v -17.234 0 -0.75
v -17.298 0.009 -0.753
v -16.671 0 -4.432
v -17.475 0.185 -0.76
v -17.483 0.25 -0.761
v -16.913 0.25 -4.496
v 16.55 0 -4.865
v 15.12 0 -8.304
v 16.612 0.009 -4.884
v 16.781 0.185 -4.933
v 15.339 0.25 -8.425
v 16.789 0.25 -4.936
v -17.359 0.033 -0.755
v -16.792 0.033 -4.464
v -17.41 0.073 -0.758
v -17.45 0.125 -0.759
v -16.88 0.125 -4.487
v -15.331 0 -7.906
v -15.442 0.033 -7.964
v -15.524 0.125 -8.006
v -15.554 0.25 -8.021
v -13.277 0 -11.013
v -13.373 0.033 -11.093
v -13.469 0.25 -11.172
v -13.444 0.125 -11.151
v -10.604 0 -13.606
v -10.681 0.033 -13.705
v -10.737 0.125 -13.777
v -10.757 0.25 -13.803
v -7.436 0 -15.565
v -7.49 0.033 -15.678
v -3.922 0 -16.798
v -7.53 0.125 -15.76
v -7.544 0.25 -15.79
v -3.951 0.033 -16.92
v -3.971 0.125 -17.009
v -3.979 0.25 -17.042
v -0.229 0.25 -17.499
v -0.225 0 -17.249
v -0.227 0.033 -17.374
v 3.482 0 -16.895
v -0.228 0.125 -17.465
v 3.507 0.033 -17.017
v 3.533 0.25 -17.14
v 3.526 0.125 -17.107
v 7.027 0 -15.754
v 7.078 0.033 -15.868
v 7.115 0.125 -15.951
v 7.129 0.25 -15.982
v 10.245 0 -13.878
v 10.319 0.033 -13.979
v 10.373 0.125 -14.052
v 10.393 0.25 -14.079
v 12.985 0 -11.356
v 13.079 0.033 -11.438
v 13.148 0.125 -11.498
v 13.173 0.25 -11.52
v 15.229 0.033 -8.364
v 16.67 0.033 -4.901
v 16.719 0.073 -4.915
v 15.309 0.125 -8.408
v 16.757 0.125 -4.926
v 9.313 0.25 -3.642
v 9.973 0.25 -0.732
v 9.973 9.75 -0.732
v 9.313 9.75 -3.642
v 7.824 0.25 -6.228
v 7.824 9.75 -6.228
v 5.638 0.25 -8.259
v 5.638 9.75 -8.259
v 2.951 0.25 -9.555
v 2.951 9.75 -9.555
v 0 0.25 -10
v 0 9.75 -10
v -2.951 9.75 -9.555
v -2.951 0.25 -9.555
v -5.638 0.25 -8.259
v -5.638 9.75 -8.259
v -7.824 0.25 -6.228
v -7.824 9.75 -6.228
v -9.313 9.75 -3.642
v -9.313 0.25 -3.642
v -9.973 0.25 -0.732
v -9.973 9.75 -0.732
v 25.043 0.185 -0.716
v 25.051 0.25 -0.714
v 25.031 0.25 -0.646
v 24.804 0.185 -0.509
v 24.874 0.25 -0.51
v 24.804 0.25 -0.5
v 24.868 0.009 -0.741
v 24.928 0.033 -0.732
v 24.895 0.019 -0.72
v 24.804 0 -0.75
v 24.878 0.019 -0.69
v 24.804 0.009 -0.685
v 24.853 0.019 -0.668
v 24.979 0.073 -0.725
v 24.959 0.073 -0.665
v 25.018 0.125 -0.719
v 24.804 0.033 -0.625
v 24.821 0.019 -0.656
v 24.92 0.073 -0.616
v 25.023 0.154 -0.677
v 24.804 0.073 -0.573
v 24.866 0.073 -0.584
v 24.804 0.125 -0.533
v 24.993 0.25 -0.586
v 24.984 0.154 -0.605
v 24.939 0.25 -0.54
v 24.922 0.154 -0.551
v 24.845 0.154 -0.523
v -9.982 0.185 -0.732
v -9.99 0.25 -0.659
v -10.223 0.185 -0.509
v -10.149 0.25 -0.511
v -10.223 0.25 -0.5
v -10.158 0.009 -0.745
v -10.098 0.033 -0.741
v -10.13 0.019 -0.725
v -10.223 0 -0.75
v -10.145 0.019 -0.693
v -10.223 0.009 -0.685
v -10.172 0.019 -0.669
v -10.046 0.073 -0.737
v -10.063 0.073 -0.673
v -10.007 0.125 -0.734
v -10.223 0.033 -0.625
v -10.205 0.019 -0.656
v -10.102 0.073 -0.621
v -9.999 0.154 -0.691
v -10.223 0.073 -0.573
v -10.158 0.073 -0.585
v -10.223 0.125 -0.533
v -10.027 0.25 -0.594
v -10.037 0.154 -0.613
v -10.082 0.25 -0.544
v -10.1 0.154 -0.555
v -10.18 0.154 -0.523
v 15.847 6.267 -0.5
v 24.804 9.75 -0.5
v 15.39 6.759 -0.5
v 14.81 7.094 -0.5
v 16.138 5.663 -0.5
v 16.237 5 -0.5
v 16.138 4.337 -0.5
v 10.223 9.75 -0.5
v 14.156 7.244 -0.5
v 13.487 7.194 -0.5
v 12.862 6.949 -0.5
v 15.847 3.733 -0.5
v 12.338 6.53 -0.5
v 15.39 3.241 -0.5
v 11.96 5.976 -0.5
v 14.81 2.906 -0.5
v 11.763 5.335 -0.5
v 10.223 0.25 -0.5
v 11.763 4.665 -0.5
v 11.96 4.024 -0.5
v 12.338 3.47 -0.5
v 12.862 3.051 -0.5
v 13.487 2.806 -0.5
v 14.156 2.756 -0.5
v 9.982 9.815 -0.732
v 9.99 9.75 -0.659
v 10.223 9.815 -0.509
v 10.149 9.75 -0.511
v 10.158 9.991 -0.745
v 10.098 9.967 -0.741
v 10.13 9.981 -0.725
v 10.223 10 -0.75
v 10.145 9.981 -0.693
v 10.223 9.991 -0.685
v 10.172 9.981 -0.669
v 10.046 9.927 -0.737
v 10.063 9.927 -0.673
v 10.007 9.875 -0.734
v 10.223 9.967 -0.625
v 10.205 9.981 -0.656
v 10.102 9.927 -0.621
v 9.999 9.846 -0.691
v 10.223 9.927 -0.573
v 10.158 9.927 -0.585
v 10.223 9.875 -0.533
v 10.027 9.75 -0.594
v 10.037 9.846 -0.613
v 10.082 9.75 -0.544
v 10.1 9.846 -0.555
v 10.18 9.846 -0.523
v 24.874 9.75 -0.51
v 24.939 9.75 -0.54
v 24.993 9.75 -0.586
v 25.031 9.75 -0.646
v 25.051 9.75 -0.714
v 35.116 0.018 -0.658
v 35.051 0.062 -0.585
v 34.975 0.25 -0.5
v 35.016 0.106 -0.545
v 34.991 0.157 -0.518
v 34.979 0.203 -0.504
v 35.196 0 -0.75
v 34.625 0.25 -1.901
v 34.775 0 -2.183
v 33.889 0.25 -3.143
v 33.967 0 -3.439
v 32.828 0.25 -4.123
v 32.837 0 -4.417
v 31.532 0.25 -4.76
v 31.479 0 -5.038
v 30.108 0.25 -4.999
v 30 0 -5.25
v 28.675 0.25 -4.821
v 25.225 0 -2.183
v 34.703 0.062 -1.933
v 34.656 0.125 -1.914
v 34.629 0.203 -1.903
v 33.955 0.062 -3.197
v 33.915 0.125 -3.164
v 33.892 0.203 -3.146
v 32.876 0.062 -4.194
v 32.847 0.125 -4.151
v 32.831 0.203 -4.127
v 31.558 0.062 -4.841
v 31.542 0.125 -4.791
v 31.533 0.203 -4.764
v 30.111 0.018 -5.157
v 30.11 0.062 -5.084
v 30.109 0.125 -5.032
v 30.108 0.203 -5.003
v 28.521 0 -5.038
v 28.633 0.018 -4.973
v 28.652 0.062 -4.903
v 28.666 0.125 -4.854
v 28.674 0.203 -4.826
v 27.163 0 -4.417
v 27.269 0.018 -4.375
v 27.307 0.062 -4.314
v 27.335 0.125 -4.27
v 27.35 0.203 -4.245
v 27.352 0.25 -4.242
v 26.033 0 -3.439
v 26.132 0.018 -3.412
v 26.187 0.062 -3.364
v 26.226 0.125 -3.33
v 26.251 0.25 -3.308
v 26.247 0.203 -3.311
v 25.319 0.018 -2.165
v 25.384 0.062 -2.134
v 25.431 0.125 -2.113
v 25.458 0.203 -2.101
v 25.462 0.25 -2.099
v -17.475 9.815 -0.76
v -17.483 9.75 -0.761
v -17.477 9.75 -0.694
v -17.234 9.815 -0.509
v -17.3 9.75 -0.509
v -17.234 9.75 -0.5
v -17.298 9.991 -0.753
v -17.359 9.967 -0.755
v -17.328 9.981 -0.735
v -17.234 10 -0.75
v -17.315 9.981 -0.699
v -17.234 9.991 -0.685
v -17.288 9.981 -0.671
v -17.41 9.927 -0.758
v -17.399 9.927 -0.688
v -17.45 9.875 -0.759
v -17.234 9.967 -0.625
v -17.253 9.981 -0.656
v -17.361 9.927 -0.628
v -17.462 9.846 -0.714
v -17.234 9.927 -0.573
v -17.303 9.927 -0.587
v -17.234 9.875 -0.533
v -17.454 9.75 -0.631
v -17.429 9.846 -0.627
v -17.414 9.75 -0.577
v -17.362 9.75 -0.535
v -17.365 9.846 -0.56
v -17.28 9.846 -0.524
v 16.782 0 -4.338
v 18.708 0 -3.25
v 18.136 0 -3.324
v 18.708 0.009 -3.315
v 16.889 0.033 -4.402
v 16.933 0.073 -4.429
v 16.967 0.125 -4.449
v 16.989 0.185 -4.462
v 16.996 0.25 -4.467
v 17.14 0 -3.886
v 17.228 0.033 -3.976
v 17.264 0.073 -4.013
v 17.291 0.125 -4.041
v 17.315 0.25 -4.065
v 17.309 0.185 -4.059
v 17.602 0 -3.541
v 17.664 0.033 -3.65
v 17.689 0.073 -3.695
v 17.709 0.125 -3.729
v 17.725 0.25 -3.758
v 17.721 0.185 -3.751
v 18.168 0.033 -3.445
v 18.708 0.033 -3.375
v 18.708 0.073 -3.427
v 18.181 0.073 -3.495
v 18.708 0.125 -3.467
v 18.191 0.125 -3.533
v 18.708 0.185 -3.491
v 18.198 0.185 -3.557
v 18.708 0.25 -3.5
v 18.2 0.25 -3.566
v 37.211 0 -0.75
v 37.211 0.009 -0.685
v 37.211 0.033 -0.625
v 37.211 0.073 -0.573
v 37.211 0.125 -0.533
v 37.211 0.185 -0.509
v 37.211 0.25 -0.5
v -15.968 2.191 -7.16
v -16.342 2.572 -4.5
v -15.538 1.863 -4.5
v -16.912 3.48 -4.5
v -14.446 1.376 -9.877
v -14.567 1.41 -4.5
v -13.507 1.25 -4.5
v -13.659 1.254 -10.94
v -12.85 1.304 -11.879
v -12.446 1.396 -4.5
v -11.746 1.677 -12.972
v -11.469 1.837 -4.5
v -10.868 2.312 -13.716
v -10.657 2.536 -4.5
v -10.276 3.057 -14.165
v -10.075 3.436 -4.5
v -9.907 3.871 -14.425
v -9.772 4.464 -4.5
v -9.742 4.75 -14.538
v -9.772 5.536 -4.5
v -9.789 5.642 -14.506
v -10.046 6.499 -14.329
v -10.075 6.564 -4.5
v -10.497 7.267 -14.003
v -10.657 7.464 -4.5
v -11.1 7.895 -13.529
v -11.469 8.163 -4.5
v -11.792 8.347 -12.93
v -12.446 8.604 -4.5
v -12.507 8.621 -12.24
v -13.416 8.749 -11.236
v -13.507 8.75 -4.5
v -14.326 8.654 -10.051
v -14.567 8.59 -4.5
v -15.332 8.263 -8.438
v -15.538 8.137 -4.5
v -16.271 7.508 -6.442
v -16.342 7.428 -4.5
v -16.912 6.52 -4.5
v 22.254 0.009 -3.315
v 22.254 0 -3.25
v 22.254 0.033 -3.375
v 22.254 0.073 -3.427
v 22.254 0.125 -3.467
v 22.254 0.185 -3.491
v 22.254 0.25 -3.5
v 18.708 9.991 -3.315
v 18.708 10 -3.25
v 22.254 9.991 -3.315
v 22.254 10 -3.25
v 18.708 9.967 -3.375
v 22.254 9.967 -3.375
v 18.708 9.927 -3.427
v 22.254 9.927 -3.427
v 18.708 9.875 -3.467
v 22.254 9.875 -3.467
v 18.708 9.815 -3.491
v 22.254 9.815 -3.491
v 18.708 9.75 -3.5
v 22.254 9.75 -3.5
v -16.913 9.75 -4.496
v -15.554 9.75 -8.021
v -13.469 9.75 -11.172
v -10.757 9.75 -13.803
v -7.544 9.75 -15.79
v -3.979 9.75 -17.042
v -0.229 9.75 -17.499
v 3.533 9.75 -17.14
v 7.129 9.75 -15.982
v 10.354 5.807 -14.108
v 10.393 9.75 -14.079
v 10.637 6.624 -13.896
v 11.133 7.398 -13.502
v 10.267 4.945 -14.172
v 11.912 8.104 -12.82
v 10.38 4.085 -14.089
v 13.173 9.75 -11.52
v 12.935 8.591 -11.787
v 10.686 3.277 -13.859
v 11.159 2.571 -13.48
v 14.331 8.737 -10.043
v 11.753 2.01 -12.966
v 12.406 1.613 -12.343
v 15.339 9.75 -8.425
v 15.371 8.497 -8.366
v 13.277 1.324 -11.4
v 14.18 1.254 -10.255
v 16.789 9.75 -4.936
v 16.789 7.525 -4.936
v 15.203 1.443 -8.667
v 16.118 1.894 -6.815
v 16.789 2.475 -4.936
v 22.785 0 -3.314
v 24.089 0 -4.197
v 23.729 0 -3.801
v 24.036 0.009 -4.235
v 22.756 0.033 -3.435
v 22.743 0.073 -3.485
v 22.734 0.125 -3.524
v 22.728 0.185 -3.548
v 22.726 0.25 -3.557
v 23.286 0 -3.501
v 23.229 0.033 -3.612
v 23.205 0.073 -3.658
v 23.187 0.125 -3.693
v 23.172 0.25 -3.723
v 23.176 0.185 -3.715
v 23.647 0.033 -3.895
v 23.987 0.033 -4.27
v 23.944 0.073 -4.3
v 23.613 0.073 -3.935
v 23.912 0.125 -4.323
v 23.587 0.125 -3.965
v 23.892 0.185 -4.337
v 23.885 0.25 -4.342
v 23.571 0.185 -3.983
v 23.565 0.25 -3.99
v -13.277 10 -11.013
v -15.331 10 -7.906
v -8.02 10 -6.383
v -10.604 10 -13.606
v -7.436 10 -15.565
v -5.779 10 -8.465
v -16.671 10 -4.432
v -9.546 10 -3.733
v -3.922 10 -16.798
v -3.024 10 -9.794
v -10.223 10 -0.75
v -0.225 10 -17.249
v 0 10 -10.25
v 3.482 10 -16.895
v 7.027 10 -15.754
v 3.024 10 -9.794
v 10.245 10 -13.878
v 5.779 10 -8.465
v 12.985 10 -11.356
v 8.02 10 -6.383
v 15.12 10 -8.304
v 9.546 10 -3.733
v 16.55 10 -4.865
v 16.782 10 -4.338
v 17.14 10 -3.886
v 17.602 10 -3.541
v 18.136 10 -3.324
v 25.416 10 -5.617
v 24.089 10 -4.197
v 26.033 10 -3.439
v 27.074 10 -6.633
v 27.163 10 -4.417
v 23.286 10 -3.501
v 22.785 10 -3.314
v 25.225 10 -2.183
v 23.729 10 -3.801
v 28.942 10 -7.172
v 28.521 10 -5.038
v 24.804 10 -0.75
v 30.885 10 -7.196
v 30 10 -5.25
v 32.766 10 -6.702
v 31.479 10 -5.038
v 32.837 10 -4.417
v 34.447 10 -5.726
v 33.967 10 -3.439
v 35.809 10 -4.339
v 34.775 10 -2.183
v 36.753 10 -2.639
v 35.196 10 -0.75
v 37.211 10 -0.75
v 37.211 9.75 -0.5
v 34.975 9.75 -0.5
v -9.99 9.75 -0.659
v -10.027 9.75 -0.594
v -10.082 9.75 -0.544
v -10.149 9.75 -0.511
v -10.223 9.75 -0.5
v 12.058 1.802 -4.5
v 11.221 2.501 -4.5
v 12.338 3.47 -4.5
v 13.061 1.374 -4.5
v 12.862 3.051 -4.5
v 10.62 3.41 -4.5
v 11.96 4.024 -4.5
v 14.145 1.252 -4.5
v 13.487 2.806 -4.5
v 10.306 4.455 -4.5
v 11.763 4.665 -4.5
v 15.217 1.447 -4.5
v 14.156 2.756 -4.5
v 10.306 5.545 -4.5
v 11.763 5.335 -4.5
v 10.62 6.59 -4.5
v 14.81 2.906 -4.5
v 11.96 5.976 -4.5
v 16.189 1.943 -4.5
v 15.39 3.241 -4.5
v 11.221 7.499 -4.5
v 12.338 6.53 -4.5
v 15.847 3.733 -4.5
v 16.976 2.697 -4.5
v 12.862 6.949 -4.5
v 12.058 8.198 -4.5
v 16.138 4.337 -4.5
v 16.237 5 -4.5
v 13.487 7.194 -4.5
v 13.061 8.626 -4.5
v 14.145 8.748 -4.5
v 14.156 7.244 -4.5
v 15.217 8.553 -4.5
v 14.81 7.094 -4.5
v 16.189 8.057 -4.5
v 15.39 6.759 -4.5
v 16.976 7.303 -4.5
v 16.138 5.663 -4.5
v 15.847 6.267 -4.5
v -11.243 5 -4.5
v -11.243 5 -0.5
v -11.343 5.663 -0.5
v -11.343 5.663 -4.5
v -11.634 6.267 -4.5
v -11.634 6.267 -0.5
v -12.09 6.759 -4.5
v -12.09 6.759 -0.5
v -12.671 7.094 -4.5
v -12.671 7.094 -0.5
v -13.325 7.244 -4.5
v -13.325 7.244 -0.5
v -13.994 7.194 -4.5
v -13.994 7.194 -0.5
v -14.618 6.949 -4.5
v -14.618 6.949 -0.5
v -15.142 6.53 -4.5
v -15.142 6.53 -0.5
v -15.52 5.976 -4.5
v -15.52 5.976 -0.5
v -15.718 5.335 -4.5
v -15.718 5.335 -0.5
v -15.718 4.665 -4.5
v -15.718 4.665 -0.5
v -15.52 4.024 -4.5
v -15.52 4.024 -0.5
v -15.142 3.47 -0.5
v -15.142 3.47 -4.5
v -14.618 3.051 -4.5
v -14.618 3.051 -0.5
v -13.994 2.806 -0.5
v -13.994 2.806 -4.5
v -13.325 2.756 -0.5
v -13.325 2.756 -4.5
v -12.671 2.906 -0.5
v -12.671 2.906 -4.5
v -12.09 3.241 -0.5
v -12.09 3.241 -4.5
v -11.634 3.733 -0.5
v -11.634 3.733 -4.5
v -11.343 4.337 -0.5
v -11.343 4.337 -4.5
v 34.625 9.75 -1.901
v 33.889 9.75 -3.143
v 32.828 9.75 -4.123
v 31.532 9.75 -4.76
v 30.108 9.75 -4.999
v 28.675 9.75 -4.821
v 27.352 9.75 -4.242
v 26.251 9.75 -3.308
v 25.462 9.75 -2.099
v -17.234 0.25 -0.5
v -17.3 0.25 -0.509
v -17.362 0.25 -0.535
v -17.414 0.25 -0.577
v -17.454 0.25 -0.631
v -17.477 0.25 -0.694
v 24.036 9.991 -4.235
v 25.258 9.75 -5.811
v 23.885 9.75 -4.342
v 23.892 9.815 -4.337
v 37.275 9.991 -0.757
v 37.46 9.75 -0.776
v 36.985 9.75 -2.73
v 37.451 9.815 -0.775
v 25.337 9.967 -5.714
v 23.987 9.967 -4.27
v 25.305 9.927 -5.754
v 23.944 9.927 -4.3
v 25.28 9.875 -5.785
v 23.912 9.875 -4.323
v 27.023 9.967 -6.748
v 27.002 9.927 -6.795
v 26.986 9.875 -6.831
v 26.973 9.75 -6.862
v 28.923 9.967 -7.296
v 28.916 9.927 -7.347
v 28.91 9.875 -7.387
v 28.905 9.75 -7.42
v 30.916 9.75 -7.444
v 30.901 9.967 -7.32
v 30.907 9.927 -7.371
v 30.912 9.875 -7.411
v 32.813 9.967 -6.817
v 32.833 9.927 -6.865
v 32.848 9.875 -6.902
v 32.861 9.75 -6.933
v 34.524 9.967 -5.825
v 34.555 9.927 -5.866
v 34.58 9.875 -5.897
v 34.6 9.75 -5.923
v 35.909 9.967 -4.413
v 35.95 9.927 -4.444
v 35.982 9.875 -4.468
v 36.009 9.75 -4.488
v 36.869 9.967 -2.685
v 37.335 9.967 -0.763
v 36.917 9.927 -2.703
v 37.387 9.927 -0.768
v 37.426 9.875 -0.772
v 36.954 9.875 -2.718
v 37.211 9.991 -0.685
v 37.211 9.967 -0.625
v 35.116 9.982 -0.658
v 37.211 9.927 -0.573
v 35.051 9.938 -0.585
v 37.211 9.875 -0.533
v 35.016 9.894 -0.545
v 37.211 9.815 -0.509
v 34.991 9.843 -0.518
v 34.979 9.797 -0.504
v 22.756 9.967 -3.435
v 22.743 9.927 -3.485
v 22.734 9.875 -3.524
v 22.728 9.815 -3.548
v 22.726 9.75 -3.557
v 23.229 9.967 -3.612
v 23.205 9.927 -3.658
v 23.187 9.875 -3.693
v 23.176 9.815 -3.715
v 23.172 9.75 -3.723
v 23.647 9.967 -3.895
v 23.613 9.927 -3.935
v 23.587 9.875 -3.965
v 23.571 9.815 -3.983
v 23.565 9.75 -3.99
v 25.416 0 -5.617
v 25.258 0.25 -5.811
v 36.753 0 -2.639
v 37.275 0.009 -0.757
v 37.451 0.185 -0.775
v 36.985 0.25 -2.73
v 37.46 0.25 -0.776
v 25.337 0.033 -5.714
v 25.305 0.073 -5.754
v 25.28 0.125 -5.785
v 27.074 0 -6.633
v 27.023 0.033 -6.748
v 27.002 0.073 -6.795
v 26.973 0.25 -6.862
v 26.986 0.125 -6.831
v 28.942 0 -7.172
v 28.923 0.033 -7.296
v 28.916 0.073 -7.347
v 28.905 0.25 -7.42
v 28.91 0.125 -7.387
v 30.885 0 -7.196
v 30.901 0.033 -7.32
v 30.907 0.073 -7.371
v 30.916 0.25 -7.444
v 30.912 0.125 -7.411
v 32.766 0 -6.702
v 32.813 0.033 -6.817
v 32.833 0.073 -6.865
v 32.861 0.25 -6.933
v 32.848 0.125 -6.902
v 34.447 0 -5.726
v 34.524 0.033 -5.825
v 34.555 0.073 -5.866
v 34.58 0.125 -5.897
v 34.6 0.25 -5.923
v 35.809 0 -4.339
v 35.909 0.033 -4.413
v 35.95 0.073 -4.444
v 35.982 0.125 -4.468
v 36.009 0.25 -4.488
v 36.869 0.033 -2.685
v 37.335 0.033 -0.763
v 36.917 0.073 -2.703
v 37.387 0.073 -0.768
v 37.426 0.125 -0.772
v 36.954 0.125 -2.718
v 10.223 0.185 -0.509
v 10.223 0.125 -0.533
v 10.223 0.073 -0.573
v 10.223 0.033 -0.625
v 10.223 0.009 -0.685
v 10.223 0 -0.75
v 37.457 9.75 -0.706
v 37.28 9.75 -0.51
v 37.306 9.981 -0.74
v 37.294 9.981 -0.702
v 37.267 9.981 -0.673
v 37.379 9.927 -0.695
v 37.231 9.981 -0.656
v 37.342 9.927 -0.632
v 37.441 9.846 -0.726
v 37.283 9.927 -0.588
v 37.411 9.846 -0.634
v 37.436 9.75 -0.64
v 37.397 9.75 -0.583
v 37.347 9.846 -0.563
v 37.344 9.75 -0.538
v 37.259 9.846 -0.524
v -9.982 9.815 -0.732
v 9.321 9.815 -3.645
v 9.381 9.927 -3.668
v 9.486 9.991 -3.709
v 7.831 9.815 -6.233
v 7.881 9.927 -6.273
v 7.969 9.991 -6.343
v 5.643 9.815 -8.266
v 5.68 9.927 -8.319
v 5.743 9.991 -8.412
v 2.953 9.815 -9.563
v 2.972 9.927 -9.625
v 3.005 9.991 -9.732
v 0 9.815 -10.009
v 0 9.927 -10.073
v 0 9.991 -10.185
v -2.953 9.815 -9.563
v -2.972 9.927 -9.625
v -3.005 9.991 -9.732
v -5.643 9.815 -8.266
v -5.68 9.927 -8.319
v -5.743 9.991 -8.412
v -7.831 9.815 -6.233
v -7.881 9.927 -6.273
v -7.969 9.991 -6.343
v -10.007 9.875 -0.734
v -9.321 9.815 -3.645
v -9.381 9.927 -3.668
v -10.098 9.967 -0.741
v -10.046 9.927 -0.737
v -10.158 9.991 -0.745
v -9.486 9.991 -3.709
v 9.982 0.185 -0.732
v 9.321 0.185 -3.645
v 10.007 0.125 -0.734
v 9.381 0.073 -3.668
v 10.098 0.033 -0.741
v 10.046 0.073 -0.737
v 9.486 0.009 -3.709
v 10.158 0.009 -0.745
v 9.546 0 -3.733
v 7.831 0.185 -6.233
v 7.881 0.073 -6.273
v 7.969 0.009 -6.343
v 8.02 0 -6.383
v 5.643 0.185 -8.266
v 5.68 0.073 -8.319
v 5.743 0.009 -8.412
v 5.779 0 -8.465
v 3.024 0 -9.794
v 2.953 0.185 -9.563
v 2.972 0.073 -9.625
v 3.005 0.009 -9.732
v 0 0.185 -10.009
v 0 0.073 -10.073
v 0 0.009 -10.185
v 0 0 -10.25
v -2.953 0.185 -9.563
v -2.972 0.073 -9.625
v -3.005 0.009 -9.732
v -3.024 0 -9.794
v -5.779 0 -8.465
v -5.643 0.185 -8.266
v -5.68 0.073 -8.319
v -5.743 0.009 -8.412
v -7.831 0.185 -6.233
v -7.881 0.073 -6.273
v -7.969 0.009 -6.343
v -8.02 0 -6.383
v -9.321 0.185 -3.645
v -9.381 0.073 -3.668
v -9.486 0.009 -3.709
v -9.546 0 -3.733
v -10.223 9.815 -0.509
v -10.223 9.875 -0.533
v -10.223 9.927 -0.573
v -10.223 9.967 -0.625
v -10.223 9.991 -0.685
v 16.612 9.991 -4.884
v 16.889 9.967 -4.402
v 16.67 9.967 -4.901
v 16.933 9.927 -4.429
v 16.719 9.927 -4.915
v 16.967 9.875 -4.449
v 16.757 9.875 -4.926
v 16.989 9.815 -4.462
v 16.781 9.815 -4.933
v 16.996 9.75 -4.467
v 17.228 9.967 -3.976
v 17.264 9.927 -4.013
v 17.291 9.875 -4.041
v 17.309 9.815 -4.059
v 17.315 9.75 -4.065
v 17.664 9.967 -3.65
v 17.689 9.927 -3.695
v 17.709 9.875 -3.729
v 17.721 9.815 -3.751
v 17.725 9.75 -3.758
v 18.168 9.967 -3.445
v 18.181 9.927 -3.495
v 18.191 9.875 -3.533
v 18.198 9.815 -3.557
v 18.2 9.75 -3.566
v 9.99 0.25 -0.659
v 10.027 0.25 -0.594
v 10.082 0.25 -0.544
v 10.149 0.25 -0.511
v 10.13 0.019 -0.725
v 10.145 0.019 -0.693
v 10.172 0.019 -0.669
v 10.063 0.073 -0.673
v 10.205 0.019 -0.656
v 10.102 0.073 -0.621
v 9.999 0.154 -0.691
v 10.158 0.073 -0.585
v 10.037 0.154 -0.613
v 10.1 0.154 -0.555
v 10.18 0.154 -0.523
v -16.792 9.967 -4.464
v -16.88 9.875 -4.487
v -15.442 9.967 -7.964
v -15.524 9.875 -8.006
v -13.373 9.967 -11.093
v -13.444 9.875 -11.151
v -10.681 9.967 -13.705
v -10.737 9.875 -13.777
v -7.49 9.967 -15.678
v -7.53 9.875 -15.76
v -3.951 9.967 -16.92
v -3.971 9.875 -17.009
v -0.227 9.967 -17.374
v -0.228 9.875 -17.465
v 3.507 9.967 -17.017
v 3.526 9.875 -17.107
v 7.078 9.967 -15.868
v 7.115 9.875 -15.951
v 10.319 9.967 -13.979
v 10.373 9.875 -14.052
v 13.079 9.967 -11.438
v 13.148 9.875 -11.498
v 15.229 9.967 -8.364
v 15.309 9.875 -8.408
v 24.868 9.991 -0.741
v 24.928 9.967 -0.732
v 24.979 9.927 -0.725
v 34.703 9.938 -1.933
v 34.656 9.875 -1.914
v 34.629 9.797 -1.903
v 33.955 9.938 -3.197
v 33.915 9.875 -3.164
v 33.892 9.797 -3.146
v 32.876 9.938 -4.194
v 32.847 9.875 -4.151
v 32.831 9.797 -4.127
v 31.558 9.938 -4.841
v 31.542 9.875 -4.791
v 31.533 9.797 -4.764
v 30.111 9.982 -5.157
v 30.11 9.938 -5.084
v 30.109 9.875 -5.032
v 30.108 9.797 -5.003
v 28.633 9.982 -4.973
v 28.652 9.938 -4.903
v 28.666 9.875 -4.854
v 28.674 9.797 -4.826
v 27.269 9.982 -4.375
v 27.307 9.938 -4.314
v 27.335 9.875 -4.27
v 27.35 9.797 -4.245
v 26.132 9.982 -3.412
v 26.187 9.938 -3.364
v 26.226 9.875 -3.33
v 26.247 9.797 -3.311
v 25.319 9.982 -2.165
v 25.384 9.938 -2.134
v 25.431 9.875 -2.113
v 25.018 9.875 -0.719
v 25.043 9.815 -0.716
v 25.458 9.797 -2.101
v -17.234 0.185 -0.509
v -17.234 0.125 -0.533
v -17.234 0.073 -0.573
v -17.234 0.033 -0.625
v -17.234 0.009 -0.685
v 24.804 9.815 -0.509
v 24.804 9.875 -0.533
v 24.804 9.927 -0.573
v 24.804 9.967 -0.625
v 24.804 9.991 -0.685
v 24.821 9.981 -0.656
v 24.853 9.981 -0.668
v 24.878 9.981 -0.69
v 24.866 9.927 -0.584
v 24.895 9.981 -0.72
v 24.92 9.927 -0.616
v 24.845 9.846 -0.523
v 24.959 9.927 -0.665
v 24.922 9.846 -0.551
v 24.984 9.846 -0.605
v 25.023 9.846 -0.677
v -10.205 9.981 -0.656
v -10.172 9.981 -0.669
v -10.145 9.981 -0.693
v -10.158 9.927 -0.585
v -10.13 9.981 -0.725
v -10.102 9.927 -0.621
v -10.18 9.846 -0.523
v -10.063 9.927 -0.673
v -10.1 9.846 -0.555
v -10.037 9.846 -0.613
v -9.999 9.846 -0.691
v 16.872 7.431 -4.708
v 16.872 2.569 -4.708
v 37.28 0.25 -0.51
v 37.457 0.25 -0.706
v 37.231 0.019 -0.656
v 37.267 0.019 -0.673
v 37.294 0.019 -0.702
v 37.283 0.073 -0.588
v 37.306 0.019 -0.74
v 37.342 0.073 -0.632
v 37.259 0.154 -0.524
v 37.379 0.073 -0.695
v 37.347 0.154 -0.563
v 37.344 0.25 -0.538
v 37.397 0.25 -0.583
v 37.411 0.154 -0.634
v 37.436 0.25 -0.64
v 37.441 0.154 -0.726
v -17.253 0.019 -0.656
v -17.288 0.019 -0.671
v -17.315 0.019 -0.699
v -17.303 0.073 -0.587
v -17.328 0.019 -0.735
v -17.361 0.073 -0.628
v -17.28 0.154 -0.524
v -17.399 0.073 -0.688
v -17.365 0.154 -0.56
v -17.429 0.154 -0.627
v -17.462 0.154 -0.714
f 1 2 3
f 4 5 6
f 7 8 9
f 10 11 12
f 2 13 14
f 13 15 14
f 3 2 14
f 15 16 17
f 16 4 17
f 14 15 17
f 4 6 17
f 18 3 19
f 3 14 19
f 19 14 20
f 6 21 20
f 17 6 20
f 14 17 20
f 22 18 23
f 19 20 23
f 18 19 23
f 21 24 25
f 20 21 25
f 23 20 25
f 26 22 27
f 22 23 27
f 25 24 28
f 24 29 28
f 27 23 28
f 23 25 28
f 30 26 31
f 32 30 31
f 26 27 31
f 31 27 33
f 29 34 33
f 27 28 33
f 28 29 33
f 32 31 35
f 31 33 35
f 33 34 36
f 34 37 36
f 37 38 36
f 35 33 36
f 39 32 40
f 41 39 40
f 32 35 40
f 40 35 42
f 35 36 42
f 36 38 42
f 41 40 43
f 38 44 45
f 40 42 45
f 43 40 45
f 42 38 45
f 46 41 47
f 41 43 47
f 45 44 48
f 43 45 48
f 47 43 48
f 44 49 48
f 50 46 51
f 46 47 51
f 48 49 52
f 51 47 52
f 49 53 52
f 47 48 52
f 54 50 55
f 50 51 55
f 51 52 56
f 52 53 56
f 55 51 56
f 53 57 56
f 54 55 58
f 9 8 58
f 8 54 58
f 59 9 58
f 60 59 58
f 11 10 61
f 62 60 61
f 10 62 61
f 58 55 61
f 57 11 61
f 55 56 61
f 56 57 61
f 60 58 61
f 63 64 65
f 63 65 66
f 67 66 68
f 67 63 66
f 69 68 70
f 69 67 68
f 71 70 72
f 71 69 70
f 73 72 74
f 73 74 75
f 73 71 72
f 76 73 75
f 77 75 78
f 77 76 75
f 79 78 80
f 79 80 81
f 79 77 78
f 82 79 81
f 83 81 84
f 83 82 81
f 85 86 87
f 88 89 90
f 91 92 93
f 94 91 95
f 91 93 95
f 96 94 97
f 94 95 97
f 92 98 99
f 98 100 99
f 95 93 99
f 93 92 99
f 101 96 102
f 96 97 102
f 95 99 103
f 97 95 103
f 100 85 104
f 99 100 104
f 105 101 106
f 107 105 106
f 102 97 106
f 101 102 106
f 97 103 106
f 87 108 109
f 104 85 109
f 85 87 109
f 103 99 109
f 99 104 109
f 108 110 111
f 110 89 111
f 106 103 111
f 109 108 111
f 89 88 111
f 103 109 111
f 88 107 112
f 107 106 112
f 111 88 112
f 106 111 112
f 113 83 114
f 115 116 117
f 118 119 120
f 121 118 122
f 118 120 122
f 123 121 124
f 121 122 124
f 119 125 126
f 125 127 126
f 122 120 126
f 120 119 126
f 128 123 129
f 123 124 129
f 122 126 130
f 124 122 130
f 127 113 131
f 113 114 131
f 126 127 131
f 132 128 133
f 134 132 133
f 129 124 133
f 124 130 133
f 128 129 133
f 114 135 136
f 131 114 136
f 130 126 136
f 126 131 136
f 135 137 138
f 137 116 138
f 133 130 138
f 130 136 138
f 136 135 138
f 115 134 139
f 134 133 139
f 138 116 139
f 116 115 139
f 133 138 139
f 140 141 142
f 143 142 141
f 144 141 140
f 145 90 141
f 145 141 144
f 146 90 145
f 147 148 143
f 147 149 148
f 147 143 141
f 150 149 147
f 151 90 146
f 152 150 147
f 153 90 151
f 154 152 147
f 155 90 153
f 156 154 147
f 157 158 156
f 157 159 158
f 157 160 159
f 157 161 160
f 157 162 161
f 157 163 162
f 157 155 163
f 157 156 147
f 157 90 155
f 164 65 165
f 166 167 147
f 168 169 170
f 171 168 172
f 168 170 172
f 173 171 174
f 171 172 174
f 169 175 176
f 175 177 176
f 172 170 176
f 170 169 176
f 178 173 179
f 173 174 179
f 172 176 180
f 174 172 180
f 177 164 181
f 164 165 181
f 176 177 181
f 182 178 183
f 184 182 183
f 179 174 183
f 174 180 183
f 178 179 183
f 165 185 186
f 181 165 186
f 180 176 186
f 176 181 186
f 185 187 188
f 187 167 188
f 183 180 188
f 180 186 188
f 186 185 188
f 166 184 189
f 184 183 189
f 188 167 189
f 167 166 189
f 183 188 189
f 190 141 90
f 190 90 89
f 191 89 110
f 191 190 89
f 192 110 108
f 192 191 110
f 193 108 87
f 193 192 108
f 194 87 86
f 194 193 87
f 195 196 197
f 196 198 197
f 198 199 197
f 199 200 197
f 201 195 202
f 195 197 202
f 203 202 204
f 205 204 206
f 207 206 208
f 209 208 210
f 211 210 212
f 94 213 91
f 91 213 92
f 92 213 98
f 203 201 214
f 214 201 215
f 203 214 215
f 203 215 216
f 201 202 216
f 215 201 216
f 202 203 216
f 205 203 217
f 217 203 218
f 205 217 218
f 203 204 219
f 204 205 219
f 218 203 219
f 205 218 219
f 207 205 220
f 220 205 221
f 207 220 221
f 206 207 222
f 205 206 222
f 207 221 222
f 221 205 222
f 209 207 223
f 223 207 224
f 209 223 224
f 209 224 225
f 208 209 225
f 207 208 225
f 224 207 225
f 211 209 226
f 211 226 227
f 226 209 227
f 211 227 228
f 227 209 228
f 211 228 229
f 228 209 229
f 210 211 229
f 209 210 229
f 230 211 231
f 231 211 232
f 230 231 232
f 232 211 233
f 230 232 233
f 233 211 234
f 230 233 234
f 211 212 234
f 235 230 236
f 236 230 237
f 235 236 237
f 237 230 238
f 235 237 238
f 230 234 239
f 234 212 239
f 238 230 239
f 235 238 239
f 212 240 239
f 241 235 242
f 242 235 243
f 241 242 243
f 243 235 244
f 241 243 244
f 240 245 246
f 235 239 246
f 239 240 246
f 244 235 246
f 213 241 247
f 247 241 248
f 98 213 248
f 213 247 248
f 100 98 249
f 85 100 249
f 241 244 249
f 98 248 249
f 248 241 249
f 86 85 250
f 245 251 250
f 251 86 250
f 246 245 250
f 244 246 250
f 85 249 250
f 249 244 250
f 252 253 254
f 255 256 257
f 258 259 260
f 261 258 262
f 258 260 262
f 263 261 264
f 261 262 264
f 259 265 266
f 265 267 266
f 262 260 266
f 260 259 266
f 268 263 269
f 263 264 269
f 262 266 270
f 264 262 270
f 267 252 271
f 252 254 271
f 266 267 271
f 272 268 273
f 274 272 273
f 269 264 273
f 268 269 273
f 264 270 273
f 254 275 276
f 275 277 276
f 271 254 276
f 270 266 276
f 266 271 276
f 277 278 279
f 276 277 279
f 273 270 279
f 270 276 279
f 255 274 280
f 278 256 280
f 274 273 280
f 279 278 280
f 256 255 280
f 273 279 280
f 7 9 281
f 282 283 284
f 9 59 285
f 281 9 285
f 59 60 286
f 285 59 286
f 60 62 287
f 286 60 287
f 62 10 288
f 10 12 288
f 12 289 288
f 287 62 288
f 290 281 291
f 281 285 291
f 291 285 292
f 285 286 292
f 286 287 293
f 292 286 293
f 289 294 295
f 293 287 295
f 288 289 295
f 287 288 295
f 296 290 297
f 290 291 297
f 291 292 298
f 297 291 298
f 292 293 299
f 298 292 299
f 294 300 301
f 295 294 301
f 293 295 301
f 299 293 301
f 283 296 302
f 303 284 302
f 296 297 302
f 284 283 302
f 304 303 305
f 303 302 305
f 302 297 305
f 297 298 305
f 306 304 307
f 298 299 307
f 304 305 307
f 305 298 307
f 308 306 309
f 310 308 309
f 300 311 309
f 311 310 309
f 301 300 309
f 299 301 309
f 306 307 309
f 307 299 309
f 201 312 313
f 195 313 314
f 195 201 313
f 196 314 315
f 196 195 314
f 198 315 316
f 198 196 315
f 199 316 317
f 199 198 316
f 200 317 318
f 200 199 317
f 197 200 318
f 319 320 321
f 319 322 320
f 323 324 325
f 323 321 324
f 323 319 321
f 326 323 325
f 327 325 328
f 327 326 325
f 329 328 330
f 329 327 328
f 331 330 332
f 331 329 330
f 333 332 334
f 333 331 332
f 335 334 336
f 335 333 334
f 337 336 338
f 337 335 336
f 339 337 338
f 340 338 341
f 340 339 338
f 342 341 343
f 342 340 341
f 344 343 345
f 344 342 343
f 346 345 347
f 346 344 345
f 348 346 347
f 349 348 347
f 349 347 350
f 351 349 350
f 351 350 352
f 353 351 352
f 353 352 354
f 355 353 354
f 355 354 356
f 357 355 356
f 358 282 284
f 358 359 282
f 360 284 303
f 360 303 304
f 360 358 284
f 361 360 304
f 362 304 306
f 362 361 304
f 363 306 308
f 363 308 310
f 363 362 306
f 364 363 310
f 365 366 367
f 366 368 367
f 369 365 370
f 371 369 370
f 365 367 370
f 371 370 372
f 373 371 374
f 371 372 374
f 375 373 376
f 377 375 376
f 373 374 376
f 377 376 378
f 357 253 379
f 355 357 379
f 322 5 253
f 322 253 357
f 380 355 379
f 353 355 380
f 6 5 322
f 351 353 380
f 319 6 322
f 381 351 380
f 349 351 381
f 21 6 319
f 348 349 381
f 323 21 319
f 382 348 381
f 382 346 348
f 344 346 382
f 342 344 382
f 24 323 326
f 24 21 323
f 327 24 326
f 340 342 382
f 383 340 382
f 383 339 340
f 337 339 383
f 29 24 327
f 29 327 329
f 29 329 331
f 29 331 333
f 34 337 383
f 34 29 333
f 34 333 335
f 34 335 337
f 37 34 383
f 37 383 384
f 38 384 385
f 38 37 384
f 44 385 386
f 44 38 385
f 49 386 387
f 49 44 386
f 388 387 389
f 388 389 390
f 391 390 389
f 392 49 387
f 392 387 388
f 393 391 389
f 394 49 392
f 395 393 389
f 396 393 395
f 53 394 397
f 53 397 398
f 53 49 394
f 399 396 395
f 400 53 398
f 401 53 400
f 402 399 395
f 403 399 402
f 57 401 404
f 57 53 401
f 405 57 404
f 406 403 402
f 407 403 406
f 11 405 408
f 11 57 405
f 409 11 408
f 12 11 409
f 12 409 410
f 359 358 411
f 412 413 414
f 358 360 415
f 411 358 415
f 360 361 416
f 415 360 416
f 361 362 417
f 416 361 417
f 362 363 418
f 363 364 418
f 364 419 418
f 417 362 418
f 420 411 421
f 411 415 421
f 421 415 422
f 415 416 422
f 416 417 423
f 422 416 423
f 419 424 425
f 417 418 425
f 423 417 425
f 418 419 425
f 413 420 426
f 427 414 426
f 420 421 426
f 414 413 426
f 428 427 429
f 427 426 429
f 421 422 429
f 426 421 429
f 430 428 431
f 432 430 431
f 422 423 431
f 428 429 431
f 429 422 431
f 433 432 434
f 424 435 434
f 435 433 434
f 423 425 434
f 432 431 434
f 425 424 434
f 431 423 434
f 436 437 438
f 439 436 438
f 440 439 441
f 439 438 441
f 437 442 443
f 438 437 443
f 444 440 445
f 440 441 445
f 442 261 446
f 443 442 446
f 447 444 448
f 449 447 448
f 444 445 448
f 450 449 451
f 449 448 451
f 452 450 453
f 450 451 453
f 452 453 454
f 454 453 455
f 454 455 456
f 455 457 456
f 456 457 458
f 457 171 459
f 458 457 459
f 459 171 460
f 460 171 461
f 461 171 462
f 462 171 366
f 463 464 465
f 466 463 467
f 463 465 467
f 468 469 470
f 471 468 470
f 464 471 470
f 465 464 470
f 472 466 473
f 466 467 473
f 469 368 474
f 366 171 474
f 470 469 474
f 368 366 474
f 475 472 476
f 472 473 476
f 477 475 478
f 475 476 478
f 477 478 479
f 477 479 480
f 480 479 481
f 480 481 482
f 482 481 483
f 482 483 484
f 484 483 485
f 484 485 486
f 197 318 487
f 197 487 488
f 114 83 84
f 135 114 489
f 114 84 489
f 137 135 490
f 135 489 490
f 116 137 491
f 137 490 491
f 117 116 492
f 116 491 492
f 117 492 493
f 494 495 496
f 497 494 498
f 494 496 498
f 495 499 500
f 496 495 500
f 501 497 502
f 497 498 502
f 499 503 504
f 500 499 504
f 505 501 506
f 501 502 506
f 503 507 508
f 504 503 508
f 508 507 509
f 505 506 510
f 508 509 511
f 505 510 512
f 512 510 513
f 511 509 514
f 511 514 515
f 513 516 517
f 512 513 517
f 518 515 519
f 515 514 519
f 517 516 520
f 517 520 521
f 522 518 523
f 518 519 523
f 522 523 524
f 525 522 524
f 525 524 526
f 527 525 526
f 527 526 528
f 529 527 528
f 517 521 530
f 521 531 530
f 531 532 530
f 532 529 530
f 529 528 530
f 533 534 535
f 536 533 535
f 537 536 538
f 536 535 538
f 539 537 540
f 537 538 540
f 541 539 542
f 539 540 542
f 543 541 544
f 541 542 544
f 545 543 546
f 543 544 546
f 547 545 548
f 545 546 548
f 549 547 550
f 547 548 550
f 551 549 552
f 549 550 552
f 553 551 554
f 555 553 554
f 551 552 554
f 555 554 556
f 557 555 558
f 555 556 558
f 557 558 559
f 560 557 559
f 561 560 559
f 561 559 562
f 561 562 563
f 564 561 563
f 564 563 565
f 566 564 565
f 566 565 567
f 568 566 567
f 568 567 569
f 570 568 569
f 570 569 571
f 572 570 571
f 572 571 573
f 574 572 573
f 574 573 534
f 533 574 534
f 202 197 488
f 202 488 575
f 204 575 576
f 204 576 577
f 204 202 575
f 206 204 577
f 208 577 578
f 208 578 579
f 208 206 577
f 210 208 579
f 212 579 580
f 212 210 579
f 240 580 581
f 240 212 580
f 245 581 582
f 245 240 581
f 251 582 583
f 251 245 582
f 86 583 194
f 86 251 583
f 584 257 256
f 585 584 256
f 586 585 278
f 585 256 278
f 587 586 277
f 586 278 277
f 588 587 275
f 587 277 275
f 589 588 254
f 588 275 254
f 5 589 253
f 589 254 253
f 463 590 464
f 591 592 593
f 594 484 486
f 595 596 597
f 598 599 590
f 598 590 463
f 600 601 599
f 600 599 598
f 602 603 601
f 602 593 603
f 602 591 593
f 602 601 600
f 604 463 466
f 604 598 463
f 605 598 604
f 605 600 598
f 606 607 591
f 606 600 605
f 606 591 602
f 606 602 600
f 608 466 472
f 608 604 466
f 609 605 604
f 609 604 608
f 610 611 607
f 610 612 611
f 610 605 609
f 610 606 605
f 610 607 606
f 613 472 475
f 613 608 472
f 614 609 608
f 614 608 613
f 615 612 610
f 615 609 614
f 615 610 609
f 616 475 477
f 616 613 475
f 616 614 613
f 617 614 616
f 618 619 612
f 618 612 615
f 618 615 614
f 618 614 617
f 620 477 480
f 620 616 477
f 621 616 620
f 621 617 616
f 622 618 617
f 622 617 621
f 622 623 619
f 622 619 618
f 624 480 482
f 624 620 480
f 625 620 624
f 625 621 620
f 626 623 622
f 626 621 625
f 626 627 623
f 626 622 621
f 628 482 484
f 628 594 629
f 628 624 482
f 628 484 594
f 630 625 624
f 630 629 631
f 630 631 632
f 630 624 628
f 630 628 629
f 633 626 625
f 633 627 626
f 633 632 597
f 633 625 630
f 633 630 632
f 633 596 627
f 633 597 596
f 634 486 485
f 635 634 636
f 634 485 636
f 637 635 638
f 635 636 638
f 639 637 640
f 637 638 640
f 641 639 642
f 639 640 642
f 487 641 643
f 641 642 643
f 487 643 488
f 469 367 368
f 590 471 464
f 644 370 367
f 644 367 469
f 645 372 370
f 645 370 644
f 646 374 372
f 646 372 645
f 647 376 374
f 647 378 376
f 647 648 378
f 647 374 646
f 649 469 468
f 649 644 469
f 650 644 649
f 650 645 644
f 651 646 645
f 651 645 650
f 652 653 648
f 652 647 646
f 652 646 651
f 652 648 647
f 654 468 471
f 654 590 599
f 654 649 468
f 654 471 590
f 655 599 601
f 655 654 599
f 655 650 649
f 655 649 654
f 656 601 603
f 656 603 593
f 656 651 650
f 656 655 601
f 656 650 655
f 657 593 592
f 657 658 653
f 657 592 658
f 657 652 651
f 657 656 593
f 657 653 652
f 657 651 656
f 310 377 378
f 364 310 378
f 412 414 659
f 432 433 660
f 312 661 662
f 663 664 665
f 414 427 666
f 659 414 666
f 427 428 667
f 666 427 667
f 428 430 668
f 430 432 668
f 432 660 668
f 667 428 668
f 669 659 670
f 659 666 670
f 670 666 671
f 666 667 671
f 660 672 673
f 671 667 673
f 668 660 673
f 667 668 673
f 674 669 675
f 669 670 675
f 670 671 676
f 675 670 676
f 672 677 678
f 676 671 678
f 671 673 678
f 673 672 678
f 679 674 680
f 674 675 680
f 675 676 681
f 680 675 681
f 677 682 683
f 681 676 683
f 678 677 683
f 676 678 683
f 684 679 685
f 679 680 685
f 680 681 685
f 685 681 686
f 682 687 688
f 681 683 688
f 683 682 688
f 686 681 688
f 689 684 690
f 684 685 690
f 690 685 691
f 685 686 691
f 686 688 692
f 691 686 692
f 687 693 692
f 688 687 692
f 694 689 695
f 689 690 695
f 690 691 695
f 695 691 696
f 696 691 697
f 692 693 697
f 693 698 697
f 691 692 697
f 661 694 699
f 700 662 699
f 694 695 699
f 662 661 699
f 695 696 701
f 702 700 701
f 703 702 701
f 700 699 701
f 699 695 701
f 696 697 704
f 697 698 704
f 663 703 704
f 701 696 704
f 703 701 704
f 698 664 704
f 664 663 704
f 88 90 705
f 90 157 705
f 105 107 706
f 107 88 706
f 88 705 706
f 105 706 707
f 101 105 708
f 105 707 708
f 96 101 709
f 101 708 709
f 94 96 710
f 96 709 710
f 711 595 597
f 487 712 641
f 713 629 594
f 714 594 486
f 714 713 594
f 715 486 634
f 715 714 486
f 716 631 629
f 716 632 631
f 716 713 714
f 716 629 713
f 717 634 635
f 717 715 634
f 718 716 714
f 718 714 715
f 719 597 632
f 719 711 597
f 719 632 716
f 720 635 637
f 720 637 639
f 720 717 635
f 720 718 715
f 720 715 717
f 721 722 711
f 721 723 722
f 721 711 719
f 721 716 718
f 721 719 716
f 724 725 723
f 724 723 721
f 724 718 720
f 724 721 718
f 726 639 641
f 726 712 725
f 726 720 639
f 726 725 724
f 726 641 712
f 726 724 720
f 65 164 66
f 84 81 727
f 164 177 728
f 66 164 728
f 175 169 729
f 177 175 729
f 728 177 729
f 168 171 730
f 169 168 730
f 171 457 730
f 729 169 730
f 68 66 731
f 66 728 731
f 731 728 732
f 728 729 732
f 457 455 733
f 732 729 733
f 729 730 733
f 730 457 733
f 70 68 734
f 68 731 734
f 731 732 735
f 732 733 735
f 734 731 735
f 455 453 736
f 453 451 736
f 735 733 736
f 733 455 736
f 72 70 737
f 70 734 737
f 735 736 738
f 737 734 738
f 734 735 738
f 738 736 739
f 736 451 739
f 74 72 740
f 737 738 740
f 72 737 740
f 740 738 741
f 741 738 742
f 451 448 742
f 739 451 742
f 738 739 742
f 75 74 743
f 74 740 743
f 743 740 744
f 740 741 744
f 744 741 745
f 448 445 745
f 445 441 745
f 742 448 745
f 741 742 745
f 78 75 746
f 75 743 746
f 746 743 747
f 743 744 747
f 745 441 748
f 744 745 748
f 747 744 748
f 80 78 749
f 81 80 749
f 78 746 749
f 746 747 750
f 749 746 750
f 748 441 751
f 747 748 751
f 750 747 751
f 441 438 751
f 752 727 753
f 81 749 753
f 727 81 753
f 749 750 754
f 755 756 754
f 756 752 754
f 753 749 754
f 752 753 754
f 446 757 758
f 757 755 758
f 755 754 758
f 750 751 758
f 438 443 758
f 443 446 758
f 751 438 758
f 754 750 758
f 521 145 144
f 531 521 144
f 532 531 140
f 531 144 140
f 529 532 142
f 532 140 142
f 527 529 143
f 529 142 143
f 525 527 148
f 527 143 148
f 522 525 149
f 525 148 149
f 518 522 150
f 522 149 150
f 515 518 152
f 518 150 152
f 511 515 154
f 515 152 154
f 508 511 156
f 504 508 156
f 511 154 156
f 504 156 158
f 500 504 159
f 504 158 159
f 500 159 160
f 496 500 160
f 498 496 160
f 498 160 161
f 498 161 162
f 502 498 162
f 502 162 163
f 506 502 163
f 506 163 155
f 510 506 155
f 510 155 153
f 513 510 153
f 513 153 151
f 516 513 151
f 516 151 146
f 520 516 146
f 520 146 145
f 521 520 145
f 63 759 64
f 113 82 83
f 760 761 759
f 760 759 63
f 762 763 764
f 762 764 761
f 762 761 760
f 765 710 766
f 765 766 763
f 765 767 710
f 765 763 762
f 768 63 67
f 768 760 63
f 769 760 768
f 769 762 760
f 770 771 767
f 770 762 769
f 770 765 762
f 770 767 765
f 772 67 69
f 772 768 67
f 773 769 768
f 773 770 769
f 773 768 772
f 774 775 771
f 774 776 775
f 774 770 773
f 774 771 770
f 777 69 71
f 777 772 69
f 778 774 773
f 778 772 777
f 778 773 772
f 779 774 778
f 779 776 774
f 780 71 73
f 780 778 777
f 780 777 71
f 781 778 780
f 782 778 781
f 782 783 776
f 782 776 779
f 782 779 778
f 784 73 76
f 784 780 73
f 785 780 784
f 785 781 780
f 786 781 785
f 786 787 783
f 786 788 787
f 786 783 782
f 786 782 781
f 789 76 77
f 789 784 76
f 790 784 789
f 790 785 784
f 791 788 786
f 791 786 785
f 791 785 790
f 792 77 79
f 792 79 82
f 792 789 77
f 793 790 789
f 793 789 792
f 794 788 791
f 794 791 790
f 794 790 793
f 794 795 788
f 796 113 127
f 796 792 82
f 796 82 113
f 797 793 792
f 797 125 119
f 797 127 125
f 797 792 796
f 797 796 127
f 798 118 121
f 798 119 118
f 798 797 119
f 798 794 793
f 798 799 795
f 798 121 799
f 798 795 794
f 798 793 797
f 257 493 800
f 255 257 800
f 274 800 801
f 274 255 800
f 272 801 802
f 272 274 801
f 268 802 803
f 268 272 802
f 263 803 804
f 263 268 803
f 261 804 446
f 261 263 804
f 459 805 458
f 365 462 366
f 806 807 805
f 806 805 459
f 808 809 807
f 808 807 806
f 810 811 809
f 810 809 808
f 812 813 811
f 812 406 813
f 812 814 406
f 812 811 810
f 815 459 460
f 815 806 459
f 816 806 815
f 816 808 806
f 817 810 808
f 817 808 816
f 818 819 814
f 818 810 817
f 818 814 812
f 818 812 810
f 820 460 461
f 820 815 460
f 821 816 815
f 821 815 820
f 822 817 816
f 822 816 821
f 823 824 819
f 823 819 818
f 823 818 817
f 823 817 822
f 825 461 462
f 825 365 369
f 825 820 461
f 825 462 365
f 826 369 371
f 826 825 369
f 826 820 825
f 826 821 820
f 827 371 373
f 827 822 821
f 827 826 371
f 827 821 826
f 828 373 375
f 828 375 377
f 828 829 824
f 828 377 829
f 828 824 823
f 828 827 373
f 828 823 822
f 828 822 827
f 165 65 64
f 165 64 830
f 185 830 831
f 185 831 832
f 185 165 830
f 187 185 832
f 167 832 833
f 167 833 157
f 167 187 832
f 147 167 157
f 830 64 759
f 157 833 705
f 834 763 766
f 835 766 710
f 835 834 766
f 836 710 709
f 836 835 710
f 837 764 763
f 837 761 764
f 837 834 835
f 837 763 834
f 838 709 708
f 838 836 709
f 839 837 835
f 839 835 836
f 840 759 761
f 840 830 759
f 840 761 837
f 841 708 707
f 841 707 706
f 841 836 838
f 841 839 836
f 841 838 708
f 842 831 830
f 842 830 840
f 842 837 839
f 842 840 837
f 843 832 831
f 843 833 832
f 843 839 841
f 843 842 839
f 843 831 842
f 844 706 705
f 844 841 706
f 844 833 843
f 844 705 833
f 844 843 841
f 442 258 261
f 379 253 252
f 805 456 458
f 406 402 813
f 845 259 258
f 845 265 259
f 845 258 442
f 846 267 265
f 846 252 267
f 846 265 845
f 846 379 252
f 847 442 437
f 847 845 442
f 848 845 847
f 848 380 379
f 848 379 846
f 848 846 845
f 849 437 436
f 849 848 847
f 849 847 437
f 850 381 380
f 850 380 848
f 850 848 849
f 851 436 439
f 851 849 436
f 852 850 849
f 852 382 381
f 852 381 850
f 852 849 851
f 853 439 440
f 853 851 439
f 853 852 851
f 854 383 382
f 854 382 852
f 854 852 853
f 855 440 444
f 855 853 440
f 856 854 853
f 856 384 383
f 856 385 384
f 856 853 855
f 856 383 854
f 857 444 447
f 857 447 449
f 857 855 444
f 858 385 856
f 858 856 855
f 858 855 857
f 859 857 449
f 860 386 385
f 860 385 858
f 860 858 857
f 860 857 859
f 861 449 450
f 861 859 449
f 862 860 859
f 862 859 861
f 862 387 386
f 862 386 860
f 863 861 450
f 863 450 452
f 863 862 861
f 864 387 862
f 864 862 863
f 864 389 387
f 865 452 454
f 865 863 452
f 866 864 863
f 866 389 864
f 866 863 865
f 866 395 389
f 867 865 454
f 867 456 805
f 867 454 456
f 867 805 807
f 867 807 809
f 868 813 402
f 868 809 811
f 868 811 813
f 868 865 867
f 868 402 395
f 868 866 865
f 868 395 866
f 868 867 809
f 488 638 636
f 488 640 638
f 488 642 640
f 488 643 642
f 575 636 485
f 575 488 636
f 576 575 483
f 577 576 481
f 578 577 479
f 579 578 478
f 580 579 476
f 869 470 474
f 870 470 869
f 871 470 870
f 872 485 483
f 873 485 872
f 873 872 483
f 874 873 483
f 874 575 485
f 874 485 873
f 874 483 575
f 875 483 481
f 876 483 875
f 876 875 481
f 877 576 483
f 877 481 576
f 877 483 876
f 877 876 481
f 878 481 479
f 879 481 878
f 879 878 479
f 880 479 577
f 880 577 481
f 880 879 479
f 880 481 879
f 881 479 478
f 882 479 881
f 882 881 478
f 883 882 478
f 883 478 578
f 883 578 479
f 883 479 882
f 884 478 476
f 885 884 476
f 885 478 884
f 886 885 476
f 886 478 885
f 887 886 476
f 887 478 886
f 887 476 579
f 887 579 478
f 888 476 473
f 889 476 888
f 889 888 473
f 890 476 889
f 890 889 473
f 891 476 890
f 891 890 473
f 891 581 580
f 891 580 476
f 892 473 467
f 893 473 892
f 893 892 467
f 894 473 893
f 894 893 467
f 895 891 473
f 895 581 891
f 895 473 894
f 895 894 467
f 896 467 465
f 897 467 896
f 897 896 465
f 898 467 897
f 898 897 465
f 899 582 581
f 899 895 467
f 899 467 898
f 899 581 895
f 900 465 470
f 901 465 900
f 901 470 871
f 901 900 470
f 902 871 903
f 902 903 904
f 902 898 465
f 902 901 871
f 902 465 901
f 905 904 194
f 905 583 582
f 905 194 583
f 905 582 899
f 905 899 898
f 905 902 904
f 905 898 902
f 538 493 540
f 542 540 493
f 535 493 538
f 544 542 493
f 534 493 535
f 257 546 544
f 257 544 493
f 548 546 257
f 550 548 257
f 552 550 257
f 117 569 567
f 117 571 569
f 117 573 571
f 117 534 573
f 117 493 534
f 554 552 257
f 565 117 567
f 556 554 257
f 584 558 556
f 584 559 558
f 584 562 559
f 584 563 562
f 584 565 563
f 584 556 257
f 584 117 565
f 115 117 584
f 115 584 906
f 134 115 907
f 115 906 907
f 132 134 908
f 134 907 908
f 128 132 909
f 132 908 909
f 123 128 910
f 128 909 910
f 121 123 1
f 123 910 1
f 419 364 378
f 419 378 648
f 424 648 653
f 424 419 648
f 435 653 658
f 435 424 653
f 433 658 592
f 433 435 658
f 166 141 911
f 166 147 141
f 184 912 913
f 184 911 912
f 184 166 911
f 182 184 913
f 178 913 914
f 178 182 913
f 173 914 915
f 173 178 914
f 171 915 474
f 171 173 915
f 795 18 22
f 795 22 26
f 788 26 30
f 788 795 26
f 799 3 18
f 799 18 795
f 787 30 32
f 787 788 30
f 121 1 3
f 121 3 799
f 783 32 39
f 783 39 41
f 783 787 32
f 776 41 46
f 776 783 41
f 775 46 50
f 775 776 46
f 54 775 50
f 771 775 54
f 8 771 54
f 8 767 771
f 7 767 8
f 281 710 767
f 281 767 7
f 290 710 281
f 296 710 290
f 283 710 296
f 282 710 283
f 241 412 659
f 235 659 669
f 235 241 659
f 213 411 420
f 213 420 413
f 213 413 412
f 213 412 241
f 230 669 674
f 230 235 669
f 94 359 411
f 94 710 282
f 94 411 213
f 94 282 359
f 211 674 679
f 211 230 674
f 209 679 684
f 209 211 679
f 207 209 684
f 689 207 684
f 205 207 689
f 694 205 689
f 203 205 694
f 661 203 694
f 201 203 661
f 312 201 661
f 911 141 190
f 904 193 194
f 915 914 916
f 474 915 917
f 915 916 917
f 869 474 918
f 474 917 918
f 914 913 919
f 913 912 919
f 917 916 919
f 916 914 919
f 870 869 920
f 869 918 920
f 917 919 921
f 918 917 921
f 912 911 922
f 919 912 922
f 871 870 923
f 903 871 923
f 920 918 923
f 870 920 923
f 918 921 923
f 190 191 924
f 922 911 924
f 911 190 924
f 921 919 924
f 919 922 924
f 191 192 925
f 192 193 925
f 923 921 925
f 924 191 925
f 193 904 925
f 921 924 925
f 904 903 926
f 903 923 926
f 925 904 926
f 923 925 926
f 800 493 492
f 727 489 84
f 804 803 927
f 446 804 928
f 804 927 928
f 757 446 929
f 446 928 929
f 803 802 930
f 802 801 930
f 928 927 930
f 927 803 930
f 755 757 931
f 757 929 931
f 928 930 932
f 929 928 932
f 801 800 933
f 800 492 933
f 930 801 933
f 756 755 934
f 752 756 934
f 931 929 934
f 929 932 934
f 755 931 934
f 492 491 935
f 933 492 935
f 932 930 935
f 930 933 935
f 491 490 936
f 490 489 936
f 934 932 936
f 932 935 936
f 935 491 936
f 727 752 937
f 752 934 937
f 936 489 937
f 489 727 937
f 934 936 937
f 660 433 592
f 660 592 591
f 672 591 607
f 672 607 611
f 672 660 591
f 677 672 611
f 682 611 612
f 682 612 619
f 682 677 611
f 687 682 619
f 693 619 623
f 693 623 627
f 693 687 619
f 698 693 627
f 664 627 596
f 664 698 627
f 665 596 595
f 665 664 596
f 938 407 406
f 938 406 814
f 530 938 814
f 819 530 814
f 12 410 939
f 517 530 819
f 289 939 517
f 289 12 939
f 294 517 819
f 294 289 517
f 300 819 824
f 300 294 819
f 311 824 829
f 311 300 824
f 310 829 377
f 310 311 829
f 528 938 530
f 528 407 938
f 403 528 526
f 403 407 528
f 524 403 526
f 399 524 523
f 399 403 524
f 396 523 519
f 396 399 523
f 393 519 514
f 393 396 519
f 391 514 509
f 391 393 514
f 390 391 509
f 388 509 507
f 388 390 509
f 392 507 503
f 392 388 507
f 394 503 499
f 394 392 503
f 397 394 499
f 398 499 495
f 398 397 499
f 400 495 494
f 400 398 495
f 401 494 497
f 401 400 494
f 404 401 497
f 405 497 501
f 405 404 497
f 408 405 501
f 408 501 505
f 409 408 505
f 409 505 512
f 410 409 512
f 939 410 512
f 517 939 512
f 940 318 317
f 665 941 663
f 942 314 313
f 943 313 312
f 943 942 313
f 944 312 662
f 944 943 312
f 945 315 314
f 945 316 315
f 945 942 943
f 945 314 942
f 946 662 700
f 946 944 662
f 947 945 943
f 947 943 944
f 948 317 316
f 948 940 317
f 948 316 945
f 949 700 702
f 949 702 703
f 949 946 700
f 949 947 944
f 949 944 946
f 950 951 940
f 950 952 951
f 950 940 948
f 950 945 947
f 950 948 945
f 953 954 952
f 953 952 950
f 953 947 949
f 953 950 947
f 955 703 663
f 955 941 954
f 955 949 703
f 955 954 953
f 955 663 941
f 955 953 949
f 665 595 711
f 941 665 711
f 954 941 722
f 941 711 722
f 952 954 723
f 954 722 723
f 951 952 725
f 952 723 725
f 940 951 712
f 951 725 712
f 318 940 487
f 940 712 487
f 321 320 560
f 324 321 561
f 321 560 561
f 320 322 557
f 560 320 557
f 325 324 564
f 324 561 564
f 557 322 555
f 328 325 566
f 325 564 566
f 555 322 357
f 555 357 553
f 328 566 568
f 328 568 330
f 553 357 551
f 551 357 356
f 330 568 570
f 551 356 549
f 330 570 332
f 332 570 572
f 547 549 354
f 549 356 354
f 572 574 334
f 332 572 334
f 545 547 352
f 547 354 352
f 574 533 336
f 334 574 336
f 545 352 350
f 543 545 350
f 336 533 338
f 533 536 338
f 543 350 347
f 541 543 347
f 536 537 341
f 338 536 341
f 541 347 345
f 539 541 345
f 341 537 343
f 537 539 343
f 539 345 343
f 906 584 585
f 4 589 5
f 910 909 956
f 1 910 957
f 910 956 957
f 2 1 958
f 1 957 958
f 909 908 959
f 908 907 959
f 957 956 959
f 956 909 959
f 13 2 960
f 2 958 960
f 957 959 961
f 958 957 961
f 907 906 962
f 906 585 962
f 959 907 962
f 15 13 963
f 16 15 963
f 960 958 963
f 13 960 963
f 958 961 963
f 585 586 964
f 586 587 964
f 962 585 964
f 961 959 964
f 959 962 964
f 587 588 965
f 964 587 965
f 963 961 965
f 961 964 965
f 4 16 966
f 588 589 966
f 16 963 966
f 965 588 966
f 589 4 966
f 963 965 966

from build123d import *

# Parameters (mm, degrees)
F1_DEPTH = 10
F2_R     = 2.25
F3_DEPTH = 25
F4_R     = 0.25
F6_R     = 3.75
F7_DEPTH = 13


with BuildPart() as f1:
    # F0 (on Front) → F1 (new body)
    with BuildSketch(Plane.XZ):
        with BuildLine():
            ThreePointArc((9.987492, -0.5), (0, -10), (-9.987492, -0.5))
            Line((-9.987492, -0.5), (-17.492856, -0.5))
            ThreePointArc((-17.492856, -0.5), (-2.245658, -17.355317), (16.789488, -4.935897))
            ThreePointArc((16.789488, -4.935897), (17.509998, -3.898718), (18.708287, -3.5))
            Line((18.708287, -3.5), (22.254033, -3.5))
            ThreePointArc((22.254033, -3.5), (23.171696, -3.722953), (23.884763, -4.342105))
            ThreePointArc((23.884763, -4.342105), (32.039204, -7.217454), (37.483315, -0.5))
            Line((37.483315, -0.5), (34.974937, -0.5))
            ThreePointArc((34.974937, -0.5), (30, -5), (25.025063, -0.5))
            Line((25.025063, -0.5), (9.987492, -0.5))
        make_face()
    extrude(amount=-F1_DEPTH)

    # F2 (on face) → F3 (cut)
    with BuildSketch(Plane.XY.offset(-0.5)):
        with Locations((-13.492856, 5)):
            Circle(F2_R)
        with Locations((13.987492, 5)):
            Circle(F2_R)
    extrude(amount=-F3_DEPTH, mode=Mode.SUBTRACT)

    # F4
    f4_edges = [f1.edges().sort_by_distance(p)[0] for p in [
        (0, 0, -10),
        (-13.740174, 0, -0.5),
        (-2.245658, 0, -17.355317),
        (17.509998, 0, -3.898718),
        (20.48116, 0, -3.5),
        (23.171696, 0, -3.722953),
        (30, 0, -5),
        (17.506277, 0, -0.5),
        (25.025063, 5, -0.5),
        (-9.987492, 5, -0.5),
        (37.483315, 5, -0.5),
        (36.229126, 0, -0.5),
        (32.039204, 0, -7.217454),
        (32.039204, 10, -7.217454),
        (-13.740174, 10, -0.5),
        (-2.245658, 10, -17.355317),
        (0, 10, -10),
        (17.506277, 10, -0.5),
        (30, 10, -5),
        (36.229126, 10, -0.5),
        (-17.492856, 5, -0.5),
        (9.987492, 5, -0.5),
    ]]
    fillet(f4_edges, radius=F4_R)

    # F6 (on offset) → F7 (cut)
    with BuildSketch(Plane.XY.offset(-17.5)):
        with Locations((-13.483452, 5)):
            Circle(F6_R)
        with Locations((14.016548, 5)):
            Circle(F6_R)
    extrude(amount=F7_DEPTH, mode=Mode.SUBTRACT)


solid = f1.part
